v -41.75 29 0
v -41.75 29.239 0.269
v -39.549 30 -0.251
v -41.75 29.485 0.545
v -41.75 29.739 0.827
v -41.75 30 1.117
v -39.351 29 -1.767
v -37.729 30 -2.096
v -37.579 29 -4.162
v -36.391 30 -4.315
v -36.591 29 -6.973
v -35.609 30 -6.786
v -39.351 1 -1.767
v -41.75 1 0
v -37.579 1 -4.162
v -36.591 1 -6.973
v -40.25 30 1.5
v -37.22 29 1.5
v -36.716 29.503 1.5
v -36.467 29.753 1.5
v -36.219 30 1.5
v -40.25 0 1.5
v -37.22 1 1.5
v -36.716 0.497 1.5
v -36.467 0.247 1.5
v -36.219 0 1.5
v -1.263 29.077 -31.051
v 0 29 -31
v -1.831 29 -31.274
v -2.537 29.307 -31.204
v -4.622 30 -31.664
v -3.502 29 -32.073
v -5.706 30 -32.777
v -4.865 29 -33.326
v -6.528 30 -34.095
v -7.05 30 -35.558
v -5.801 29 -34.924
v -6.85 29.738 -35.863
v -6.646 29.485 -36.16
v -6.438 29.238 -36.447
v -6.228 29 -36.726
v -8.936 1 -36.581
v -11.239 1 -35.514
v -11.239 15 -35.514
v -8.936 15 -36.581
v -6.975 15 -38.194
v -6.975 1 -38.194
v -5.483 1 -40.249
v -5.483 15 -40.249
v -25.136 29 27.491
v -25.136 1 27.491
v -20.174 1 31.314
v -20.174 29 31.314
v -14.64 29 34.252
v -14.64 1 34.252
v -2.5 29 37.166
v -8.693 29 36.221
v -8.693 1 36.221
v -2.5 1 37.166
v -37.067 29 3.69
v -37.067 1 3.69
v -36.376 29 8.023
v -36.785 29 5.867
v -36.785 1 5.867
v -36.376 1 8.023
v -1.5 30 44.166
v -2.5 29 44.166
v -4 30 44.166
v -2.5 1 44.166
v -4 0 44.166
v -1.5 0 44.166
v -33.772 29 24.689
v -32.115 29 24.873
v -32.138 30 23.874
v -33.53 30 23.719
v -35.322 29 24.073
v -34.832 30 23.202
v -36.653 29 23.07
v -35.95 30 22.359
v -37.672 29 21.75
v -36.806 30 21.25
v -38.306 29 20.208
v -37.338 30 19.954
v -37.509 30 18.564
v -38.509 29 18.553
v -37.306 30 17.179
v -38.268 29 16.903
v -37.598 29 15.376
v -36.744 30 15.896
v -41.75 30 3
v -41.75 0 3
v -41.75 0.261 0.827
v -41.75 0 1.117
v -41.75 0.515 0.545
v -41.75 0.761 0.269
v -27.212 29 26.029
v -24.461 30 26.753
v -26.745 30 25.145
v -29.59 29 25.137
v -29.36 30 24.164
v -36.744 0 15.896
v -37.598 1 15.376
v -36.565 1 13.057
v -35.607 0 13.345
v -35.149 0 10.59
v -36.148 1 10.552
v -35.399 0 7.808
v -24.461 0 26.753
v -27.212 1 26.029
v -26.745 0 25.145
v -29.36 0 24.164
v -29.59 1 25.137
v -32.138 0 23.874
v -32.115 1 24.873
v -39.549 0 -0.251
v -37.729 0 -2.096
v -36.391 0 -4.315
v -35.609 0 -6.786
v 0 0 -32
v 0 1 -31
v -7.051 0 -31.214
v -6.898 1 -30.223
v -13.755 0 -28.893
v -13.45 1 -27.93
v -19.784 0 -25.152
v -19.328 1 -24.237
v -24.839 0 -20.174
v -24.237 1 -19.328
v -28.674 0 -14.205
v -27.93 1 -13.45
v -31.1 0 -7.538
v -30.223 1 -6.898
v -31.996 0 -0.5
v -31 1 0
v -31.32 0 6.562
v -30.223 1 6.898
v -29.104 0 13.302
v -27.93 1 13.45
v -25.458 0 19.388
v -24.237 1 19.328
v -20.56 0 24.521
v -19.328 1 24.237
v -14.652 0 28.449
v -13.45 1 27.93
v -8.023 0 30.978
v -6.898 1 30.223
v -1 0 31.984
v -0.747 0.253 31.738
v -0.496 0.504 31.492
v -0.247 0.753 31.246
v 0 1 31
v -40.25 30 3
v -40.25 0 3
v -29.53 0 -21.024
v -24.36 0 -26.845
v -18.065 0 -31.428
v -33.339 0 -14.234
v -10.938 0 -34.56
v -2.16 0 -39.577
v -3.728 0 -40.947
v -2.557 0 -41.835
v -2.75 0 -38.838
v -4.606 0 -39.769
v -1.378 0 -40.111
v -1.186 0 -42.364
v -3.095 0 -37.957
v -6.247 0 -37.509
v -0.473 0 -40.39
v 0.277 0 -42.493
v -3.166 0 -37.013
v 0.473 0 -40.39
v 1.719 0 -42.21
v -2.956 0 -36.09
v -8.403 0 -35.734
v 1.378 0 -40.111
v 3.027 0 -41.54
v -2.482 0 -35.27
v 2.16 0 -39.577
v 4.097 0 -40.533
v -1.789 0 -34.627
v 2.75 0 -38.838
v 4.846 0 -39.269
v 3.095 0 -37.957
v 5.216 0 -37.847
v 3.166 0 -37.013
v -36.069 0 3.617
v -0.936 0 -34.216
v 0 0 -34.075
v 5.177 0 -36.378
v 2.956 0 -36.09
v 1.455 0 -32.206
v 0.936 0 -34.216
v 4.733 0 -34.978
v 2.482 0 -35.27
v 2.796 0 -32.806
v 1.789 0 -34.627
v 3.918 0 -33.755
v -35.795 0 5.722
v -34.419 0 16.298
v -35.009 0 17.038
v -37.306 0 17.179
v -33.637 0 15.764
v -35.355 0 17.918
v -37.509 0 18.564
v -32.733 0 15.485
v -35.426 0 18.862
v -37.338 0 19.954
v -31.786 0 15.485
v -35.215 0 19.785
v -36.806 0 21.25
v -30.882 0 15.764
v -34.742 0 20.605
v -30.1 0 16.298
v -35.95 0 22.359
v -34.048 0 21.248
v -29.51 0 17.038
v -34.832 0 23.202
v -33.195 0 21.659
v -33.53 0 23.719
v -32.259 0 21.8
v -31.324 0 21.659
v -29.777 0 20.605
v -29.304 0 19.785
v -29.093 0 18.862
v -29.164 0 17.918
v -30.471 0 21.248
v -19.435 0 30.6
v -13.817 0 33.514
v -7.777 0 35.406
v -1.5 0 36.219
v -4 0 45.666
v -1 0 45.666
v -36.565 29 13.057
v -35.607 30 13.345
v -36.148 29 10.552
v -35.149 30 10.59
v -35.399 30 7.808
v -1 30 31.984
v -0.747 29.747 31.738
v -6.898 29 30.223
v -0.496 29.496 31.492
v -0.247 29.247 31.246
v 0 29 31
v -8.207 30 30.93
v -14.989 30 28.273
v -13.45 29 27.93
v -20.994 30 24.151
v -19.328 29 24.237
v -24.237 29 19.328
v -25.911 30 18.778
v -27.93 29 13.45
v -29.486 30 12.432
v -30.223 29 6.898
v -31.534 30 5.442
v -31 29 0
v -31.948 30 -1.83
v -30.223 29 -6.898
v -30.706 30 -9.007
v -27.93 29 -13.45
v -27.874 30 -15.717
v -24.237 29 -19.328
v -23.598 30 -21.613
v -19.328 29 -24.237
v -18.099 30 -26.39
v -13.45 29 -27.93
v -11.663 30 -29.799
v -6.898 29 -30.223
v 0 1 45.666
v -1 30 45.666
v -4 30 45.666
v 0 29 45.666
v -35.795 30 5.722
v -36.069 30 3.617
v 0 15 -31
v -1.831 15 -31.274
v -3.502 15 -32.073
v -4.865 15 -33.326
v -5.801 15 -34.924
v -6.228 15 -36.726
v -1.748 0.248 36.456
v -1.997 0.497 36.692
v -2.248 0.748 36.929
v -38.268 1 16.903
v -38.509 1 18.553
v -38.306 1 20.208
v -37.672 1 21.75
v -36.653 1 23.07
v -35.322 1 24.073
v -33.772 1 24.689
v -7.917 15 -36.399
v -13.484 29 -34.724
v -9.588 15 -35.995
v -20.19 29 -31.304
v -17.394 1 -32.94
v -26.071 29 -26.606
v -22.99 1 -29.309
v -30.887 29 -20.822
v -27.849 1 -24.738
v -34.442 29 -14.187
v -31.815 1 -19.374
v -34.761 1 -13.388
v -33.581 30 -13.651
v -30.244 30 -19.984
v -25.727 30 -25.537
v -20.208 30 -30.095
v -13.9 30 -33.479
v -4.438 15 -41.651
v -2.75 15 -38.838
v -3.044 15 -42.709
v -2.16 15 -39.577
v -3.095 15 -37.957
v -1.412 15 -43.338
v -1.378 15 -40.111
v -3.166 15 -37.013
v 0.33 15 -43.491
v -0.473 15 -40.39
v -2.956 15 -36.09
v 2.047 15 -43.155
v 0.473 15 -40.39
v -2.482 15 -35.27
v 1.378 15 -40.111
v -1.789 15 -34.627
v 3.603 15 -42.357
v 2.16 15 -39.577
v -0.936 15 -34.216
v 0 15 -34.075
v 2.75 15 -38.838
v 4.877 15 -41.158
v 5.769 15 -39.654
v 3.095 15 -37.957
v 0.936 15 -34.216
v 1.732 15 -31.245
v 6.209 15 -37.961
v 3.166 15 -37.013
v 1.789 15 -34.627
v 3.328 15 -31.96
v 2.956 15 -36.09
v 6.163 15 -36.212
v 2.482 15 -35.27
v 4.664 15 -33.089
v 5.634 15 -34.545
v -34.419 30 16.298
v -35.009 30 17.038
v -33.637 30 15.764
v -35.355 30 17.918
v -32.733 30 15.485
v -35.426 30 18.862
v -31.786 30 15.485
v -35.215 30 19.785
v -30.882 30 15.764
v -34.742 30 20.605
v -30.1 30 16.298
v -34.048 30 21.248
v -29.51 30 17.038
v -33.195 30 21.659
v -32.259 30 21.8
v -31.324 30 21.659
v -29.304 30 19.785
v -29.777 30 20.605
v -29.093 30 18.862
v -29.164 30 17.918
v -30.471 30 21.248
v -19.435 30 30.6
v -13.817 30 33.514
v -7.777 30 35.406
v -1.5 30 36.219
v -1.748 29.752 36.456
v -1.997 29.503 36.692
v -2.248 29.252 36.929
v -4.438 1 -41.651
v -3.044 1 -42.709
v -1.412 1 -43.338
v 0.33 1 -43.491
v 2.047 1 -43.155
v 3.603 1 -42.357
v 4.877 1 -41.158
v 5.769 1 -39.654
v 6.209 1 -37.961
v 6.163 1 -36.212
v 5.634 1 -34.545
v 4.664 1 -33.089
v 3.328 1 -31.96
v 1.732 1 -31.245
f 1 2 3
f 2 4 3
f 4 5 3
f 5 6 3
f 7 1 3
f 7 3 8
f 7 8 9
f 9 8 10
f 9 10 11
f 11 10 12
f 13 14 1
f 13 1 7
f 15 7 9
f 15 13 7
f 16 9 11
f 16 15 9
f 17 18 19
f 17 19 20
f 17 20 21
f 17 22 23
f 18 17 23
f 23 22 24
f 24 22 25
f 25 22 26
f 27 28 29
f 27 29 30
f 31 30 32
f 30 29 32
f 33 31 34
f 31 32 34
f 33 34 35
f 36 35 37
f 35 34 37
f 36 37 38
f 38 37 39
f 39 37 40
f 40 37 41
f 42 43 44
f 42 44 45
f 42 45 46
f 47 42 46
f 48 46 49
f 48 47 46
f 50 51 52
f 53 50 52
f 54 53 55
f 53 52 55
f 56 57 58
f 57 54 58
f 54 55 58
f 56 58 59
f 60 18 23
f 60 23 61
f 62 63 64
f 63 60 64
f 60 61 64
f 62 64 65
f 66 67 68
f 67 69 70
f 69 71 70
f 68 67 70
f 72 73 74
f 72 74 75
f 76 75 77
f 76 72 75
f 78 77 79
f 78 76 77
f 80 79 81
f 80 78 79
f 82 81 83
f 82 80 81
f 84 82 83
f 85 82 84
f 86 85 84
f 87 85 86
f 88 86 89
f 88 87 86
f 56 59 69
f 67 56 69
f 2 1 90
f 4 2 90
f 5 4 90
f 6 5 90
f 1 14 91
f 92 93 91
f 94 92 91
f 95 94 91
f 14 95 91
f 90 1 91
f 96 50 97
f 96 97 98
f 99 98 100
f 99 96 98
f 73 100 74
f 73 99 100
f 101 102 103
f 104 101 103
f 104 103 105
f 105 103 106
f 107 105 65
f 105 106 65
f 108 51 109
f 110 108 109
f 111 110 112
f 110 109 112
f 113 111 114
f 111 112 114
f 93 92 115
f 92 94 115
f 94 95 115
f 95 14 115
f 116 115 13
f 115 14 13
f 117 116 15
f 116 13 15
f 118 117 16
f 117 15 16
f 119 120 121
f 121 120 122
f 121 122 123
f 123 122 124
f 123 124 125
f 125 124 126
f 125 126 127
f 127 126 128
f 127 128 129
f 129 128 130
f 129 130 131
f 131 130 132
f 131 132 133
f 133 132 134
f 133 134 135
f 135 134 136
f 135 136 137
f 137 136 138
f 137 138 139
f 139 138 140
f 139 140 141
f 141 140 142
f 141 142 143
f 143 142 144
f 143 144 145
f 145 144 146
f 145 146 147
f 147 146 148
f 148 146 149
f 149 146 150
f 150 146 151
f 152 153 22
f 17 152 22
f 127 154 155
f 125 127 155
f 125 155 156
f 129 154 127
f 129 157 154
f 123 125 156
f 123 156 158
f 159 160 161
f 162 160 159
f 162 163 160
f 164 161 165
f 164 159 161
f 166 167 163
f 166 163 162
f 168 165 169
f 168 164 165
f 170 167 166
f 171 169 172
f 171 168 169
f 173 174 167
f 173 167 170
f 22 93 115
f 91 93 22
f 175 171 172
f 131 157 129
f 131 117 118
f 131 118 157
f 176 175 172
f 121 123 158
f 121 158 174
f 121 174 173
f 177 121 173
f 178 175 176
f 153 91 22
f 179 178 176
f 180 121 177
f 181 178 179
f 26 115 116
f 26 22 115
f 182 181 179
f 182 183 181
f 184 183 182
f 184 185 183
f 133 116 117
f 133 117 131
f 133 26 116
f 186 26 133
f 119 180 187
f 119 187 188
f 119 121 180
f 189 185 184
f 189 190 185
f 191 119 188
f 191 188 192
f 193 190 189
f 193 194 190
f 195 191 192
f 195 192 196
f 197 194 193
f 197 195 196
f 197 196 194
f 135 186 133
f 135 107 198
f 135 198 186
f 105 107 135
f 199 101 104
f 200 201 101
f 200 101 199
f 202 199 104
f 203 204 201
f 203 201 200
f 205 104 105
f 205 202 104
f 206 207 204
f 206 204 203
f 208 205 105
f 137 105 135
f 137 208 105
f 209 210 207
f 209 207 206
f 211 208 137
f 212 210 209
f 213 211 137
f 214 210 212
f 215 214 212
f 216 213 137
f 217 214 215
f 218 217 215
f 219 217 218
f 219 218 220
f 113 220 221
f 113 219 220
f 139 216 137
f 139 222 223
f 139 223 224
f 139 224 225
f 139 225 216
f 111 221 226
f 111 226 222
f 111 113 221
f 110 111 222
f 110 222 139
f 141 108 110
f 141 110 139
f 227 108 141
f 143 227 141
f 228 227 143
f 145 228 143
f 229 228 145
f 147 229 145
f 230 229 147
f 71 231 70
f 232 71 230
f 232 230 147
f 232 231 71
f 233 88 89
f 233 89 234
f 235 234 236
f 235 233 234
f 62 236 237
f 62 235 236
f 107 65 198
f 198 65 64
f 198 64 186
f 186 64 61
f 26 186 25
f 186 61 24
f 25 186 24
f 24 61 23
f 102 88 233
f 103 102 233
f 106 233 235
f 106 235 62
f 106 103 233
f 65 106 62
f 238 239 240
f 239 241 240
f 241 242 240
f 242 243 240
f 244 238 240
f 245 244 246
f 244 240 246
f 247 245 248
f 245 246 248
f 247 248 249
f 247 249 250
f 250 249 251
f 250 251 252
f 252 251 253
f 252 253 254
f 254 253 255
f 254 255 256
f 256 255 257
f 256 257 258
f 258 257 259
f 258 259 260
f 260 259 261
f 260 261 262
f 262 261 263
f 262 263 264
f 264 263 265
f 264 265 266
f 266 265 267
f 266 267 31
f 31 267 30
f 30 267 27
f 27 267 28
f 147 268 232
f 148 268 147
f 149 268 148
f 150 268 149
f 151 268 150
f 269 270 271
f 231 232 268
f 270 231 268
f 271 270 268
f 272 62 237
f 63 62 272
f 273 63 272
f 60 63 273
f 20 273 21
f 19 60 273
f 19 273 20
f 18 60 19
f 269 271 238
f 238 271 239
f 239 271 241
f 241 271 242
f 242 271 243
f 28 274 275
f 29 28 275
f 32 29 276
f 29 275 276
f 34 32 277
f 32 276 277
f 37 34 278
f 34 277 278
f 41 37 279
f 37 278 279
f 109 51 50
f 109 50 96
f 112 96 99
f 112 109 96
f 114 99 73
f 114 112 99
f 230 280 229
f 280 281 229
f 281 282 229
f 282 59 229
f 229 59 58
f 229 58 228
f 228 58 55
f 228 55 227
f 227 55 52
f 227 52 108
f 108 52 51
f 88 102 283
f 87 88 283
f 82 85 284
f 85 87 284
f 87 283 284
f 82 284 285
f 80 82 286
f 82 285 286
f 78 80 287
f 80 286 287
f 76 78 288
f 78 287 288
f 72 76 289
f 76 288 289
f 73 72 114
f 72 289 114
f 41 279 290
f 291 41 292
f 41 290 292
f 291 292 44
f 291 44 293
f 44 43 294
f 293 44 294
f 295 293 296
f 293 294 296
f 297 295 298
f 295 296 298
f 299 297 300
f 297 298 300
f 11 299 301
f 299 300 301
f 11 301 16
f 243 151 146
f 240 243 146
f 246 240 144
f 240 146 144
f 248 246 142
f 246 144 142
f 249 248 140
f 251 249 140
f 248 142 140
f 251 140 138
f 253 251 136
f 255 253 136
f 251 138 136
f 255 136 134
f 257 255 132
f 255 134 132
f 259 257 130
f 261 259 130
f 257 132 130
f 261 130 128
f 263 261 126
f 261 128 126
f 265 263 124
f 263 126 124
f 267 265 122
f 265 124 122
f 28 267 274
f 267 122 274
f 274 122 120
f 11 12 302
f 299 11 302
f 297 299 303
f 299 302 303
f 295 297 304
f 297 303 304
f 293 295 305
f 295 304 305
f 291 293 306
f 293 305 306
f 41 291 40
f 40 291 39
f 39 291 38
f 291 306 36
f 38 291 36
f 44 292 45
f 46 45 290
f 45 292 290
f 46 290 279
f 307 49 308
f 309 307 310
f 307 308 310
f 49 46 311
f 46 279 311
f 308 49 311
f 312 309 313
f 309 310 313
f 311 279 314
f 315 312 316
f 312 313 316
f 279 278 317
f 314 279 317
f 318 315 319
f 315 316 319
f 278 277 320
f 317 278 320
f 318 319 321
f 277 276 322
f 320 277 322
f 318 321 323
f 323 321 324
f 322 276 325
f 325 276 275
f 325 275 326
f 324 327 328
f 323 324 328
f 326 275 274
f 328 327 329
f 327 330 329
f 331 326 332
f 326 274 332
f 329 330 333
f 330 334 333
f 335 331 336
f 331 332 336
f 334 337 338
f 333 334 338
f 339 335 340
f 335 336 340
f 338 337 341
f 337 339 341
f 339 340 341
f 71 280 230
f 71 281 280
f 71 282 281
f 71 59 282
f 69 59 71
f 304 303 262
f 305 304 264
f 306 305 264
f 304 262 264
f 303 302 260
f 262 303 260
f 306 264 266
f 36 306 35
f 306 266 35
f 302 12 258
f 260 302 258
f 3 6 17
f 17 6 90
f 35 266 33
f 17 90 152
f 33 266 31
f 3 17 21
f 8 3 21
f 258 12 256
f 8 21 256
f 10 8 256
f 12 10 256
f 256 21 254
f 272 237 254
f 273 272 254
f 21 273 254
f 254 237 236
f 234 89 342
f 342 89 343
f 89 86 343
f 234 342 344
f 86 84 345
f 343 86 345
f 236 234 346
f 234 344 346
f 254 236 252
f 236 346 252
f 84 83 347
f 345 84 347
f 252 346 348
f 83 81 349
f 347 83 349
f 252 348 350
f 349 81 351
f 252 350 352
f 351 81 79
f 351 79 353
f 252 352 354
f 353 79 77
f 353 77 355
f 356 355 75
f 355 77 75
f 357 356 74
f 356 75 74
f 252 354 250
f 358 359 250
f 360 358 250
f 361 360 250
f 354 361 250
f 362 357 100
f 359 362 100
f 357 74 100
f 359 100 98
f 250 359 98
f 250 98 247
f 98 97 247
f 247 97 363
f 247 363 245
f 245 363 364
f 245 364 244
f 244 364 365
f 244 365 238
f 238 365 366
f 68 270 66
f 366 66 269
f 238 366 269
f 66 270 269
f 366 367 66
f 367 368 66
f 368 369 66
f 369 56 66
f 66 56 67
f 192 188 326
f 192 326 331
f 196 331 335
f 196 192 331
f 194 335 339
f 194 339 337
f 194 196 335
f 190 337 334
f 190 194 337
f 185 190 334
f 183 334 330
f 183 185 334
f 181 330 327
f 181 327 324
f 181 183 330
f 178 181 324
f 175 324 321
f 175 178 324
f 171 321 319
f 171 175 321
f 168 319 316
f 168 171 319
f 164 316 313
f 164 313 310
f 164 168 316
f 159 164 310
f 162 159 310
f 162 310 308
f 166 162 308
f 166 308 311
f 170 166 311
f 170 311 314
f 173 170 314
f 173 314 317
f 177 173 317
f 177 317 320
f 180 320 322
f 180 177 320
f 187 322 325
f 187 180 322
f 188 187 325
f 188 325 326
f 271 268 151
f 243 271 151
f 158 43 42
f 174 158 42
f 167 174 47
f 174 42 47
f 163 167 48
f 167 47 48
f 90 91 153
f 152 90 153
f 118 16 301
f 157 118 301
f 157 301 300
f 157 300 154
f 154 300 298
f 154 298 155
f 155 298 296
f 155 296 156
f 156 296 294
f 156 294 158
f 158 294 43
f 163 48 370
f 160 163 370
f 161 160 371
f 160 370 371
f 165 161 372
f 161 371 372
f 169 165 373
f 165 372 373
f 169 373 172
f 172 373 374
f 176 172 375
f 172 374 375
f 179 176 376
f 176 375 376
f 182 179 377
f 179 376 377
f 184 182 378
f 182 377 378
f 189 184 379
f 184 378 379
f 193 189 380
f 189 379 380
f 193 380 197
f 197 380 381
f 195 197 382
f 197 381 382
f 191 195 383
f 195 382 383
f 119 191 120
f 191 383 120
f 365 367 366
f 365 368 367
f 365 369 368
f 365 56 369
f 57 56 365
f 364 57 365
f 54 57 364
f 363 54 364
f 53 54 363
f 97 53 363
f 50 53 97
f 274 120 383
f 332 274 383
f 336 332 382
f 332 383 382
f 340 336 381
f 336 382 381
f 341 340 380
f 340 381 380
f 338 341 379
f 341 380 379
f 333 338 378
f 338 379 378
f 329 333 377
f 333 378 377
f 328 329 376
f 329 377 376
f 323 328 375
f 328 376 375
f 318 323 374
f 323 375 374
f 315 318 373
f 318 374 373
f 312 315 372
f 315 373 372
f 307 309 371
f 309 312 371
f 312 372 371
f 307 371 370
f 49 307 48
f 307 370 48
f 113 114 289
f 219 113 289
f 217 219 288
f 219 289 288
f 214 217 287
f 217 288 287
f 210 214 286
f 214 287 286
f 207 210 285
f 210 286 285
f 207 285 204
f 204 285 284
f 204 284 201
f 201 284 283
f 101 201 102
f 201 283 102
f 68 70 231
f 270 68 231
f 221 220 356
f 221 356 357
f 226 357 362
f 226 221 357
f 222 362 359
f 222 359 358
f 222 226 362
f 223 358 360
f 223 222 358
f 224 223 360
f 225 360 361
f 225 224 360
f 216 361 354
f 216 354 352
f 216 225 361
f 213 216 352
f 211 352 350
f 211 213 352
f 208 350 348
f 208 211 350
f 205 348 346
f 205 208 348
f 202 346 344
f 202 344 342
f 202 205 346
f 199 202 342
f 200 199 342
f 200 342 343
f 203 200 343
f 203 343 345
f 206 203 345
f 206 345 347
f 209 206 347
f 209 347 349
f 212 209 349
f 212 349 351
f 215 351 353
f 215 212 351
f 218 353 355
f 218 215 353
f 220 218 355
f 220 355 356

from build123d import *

# Parameters (mm, degrees)
SKETCH3_R           = 3.174999999999997
BOSS_EXTRUDE2_DEPTH = 30
SKETCH3_6_R         = 6.249999999999999
SKETCH3_6_R_2       = 3.174999999999996
BOSS_EXTRUDE3_DEPTH = 15
FILLET1_R           = 10
CHAMFER1_SIZE       = 1


with BuildPart() as part:
    # Sketch3 → Boss-Extrude2 (new body)
    with BuildSketch(Plane(origin=(0, 0, 0), x_dir=(1, 0, 0), z_dir=(0, 1, 0))):
        with BuildLine():
            ThreePointArc((-9.29e-15, 31), (-4.229978997044333, 32.64893733094583), (-6.227967505338837, 36.72567114093955))
            ThreePointArc((-6.227967505338856, 36.72567114093959), (-28.456583505173906, 24.03716612275798), (-37.249999999999986, -3.82e-15))
            Line((-37.25, 0), (-41.75, -5.5e-16))
            Line((-41.75, -5.5e-16), (-41.75, -3.000000000000001))
            Line((-41.75, -3.000000000000001), (-40.25, -3.000000000000001))
            Line((-40.25, -3.000000000000001), (-40.25, -1.5000000000000004))
            Line((-40.25, -1.5000000000000004), (-37.21978640454563, -1.5000000000000004))
            ThreePointArc((-37.21978640454562, -1.5000000000000002), (-36.52259085251633, -7.325493663889764), (-34.919347931756114, -12.969257496902395))
            ThreePointArc((-34.91934793175618, -12.969257496902411), (-37.67210506462307, -21.75000000000005), (-28.691380426417297, -23.75641364403726))
            ThreePointArc((-28.691380426417272, -23.756413644037238), (-16.975861979154317, -33.15693909372066), (-2.5, -37.166012699777184))
            Line((-2.4999999999999982, -37.1660126997772), (-2.4999999999999982, -44.1660126997772))
            Line((-2.4999999999999982, -44.1660126997772), (-3.9999999999999982, -44.1660126997772))
            Line((-3.9999999999999982, -44.1660126997772), (-3.9999999999999982, -45.6660126997772))
            Line((-3.9999999999999982, -45.6660126997772), (1.8e-15, -45.6660126997772))
            Line((1.8e-15, -45.6660126997772), (8.2e-16, -30.99999999999999))
            ThreePointArc((8.2e-16, -30.999999999999986), (-30.999999999999986, -3.39e-15), (-1.128e-14, 30.999999999999993))
        make_face()
        with Locations(Location((-32.25944629097033, -18.62500000000002, 0), (0, 0, 270))):
            Circle(SKETCH3_R, mode=Mode.SUBTRACT)
    extrude(amount=BOSS_EXTRUDE2_DEPTH)

    # Sketch3<6> → Boss-Extrude3 (add)
    with BuildSketch(Plane(origin=(0, 0, 0), x_dir=(1, 0, 0), z_dir=(0, 1, 0))):
        with Locations((-8.14e-15, 37.25)):
            Circle(SKETCH3_6_R)
        with Locations(Location((-8.14e-15, 37.25, 0), (0, 0, 270))):
            Circle(SKETCH3_6_R_2, mode=Mode.SUBTRACT)
    extrude(amount=BOSS_EXTRUDE3_DEPTH)

    # Fillet1
    # the kernel refuses this fillet: 10 mm, written as the material it adds along each edge
    with BuildSketch(Plane(origin=(-28.691380426417282, 0, 23.75641364403725), x_dir=(-0.9506898736636257, 0, 0.3101431348803961), z_dir=(0, 1, 0))) as fillet1_piece_1:
        with BuildLine():
            CenterArc((6.482344939436471, 9.575990594652419), FILLET1_R, 209.4937649075162, 43.761742692679945)
            ThreePointArc((-2.221747837989829, 4.652702169021102), (-1.030276989978153, 2.3648375481367587), (0, 0))
            ThreePointArc((0, 0), (1.8006513720656931, 0.26500587834223527), (3.6013027441313774, -6e-17))
        make_face()
    extrude(amount=30)
    with BuildSketch(Plane(origin=(-34.91934793175615, 0, 12.969257496902403), x_dir=(-0.7439367704475782, 0, 0.6682500142731217), z_dir=(0, 1, 0))) as fillet1_piece_2:
        with BuildLine():
            CenterArc((6.482344939436458, -9.575990594652419), FILLET1_R, 106.74449239980393, 43.76174269267989)
            ThreePointArc((-2.2217478379898448, -4.652702169021106), (-1.0302769899781694, -2.364837548136756), (0, 0))
            ThreePointArc((0, 0), (1.8006513720656803, -0.26500587834223843), (3.601302744131356, 6e-17))
        make_face()
    extrude(amount=30)
    with BuildSketch(Plane(origin=(-6.227967505338847, 0, -36.725671140939575), x_dir=(-0.9719890656078827, 0, 0.23502607586971094), z_dir=(0, 1, 0))) as fillet1_piece_3:
        with BuildLine():
            CenterArc((5.848021683595468, -9.976022963631705), FILLET1_R, 93.96846171792617, 43.7617426926798)
            ThreePointArc((-1.5518361342237537, -3.2497978502371354), (-0.5367780683599742, -1.7390925175521244), (0, 0))
            ThreePointArc((0, 0), (2.5779740557861452, -0.08931446047189494), (5.1559481115722905, 1e-17))
        make_face()
    extrude(amount=15)
    with BuildSketch(Plane(origin=(-37.24999999999999, 0, 1.78e-15), x_dir=(-1, 0, -7.737e-14), z_dir=(0, 1, 0))) as fillet1_piece_4:
        with BuildLine():
            CenterArc((9.164670658683216, -8.845385669716253), FILLET1_R, 117.80520941997419, 51.405137085838774)
            ThreePointArc((-0.6585400627312272, -6.973346374538821), (-0.16500045393500687, -3.5021862698004864), (0, 0))
            Line((0, 0), (4.500000000000192, 0))
        make_face()
    extrude(amount=30)

    # Chamfer1
    chamfer1_edges = [part.edges().sort_by_distance(p)[0] for p in [
        (-7.903771868670522, 0, -37.32519260636591),
        (-38.375294648334496, 0, -2.898249101229199),
        (-38.375294648334496, 30, -2.898249101229199),
        (-36.27645093259372, 0, 11.817729079196308),
        (-36.27645093259372, 30, 11.817729079196308),
        (-30.999999999999986, 0, 5.16e-15),
        (1.31e-15, 0, 38.33300634988859),
        (-2.4999999999999982, 0, 40.6660126997772),
        (-14.640454765554196, 0, 34.25229312407797),
        (-14.640454765554196, 30, 34.25229312407797),
        (-2.4999999999999982, 30, 40.6660126997772),
        (1.31e-15, 30, 38.33300634988859),
        (-30.999999999999986, 30, 5.16e-15),
        (-4.2299789970443324, 30, -32.64893733094583),
        (5.376209478406283, 0, -40.43729848685283),
        (-37.672105064623324, 0, 21.749999999999595),
        (-37.672105064623324, 30, 21.749999999999595),
        (-27.849428165120642, 0, -24.7380648167108),
        (-26.07059740166155, 30, -26.60613559163521),
        (-36.941998560282954, 0, 4.780297310006034),
        (-36.941998560282954, 30, 4.780297310006034),
        (-28.372679063924544, 0, 25.507463527167676),
        (-28.372679063924544, 30, 25.507463527167676),
    ]]
    chamfer(chamfer1_edges, length=CHAMFER1_SIZE)


solid = part.part
